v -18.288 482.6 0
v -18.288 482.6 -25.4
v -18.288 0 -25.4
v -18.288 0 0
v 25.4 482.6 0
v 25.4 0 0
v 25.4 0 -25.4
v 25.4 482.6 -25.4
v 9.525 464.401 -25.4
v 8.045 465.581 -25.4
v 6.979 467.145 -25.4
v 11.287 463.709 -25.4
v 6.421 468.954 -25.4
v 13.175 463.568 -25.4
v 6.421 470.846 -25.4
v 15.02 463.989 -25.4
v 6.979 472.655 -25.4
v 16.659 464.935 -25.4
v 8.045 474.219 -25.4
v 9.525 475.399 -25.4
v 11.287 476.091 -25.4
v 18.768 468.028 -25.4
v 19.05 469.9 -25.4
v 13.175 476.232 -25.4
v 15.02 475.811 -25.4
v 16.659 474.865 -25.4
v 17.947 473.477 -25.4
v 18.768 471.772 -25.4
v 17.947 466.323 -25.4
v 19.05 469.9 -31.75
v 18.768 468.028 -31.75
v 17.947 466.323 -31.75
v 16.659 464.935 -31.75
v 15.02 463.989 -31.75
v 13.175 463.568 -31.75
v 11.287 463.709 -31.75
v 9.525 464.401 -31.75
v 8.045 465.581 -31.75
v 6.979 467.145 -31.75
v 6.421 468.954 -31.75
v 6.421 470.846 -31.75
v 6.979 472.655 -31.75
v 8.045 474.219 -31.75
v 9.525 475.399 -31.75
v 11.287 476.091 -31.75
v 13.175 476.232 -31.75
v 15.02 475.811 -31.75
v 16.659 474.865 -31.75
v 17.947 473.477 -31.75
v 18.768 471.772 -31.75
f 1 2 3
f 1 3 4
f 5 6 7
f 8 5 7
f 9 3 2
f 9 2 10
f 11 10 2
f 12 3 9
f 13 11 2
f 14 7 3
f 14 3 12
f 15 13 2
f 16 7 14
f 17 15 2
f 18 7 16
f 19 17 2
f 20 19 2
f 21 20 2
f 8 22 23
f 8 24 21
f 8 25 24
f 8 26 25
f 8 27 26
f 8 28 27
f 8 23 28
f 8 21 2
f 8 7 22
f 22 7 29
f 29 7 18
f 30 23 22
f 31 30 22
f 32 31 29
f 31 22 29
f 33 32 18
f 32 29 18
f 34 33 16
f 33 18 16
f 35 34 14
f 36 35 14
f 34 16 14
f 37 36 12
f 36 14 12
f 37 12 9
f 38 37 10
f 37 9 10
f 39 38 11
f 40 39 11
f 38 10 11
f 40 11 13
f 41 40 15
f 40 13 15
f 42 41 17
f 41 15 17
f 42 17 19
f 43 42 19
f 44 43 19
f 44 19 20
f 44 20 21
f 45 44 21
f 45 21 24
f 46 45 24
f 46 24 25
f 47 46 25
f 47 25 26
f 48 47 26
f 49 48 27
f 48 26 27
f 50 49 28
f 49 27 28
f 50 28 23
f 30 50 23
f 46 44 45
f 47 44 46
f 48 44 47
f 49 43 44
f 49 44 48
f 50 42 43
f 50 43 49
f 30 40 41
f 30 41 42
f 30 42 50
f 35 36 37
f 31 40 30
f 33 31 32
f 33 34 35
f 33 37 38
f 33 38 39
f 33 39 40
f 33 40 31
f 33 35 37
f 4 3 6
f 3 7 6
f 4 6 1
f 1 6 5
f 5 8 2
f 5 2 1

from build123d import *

# Parameters (mm, degrees)
SKETCH1_W           = 25.4
SKETCH1_H           = 25.4
BOSS_EXTRUDE1_DEPTH = 482.6
SKETCH2_R           = 6.35
BOSS_EXTRUDE2_DEPTH = 6.35
SKETCH3_W           = 25.4
SKETCH3_H           = 482.6
BOSS_EXTRUDE3_DEPTH = 18.288


with BuildPart() as part:
    # Sketch1 → Boss-Extrude1 (new body)
    with BuildSketch(Plane(origin=(0, 0, 0), x_dir=(1, 0, 0), z_dir=(0, 1, 0))):
        with Locations((12.7, 12.7)):
            Rectangle(SKETCH1_W, SKETCH1_H)
    extrude(amount=BOSS_EXTRUDE1_DEPTH)

    # Sketch2 → Boss-Extrude2 (add)
    with BuildSketch(Plane(origin=(0, 0, -25.4), x_dir=(-1, 0, 0), z_dir=(0, 0, -1))):
        with Locations(Location((-12.7, 469.9, 0), (0, 0, 180))):
            Circle(SKETCH2_R)
    extrude(amount=BOSS_EXTRUDE2_DEPTH)

    # Sketch3 → Boss-Extrude3 (add)
    with BuildSketch(Plane.ZY):
        with Locations((-12.7, 241.3)):
            Rectangle(SKETCH3_W, SKETCH3_H)
    extrude(amount=BOSS_EXTRUDE3_DEPTH)


solid = part.part
